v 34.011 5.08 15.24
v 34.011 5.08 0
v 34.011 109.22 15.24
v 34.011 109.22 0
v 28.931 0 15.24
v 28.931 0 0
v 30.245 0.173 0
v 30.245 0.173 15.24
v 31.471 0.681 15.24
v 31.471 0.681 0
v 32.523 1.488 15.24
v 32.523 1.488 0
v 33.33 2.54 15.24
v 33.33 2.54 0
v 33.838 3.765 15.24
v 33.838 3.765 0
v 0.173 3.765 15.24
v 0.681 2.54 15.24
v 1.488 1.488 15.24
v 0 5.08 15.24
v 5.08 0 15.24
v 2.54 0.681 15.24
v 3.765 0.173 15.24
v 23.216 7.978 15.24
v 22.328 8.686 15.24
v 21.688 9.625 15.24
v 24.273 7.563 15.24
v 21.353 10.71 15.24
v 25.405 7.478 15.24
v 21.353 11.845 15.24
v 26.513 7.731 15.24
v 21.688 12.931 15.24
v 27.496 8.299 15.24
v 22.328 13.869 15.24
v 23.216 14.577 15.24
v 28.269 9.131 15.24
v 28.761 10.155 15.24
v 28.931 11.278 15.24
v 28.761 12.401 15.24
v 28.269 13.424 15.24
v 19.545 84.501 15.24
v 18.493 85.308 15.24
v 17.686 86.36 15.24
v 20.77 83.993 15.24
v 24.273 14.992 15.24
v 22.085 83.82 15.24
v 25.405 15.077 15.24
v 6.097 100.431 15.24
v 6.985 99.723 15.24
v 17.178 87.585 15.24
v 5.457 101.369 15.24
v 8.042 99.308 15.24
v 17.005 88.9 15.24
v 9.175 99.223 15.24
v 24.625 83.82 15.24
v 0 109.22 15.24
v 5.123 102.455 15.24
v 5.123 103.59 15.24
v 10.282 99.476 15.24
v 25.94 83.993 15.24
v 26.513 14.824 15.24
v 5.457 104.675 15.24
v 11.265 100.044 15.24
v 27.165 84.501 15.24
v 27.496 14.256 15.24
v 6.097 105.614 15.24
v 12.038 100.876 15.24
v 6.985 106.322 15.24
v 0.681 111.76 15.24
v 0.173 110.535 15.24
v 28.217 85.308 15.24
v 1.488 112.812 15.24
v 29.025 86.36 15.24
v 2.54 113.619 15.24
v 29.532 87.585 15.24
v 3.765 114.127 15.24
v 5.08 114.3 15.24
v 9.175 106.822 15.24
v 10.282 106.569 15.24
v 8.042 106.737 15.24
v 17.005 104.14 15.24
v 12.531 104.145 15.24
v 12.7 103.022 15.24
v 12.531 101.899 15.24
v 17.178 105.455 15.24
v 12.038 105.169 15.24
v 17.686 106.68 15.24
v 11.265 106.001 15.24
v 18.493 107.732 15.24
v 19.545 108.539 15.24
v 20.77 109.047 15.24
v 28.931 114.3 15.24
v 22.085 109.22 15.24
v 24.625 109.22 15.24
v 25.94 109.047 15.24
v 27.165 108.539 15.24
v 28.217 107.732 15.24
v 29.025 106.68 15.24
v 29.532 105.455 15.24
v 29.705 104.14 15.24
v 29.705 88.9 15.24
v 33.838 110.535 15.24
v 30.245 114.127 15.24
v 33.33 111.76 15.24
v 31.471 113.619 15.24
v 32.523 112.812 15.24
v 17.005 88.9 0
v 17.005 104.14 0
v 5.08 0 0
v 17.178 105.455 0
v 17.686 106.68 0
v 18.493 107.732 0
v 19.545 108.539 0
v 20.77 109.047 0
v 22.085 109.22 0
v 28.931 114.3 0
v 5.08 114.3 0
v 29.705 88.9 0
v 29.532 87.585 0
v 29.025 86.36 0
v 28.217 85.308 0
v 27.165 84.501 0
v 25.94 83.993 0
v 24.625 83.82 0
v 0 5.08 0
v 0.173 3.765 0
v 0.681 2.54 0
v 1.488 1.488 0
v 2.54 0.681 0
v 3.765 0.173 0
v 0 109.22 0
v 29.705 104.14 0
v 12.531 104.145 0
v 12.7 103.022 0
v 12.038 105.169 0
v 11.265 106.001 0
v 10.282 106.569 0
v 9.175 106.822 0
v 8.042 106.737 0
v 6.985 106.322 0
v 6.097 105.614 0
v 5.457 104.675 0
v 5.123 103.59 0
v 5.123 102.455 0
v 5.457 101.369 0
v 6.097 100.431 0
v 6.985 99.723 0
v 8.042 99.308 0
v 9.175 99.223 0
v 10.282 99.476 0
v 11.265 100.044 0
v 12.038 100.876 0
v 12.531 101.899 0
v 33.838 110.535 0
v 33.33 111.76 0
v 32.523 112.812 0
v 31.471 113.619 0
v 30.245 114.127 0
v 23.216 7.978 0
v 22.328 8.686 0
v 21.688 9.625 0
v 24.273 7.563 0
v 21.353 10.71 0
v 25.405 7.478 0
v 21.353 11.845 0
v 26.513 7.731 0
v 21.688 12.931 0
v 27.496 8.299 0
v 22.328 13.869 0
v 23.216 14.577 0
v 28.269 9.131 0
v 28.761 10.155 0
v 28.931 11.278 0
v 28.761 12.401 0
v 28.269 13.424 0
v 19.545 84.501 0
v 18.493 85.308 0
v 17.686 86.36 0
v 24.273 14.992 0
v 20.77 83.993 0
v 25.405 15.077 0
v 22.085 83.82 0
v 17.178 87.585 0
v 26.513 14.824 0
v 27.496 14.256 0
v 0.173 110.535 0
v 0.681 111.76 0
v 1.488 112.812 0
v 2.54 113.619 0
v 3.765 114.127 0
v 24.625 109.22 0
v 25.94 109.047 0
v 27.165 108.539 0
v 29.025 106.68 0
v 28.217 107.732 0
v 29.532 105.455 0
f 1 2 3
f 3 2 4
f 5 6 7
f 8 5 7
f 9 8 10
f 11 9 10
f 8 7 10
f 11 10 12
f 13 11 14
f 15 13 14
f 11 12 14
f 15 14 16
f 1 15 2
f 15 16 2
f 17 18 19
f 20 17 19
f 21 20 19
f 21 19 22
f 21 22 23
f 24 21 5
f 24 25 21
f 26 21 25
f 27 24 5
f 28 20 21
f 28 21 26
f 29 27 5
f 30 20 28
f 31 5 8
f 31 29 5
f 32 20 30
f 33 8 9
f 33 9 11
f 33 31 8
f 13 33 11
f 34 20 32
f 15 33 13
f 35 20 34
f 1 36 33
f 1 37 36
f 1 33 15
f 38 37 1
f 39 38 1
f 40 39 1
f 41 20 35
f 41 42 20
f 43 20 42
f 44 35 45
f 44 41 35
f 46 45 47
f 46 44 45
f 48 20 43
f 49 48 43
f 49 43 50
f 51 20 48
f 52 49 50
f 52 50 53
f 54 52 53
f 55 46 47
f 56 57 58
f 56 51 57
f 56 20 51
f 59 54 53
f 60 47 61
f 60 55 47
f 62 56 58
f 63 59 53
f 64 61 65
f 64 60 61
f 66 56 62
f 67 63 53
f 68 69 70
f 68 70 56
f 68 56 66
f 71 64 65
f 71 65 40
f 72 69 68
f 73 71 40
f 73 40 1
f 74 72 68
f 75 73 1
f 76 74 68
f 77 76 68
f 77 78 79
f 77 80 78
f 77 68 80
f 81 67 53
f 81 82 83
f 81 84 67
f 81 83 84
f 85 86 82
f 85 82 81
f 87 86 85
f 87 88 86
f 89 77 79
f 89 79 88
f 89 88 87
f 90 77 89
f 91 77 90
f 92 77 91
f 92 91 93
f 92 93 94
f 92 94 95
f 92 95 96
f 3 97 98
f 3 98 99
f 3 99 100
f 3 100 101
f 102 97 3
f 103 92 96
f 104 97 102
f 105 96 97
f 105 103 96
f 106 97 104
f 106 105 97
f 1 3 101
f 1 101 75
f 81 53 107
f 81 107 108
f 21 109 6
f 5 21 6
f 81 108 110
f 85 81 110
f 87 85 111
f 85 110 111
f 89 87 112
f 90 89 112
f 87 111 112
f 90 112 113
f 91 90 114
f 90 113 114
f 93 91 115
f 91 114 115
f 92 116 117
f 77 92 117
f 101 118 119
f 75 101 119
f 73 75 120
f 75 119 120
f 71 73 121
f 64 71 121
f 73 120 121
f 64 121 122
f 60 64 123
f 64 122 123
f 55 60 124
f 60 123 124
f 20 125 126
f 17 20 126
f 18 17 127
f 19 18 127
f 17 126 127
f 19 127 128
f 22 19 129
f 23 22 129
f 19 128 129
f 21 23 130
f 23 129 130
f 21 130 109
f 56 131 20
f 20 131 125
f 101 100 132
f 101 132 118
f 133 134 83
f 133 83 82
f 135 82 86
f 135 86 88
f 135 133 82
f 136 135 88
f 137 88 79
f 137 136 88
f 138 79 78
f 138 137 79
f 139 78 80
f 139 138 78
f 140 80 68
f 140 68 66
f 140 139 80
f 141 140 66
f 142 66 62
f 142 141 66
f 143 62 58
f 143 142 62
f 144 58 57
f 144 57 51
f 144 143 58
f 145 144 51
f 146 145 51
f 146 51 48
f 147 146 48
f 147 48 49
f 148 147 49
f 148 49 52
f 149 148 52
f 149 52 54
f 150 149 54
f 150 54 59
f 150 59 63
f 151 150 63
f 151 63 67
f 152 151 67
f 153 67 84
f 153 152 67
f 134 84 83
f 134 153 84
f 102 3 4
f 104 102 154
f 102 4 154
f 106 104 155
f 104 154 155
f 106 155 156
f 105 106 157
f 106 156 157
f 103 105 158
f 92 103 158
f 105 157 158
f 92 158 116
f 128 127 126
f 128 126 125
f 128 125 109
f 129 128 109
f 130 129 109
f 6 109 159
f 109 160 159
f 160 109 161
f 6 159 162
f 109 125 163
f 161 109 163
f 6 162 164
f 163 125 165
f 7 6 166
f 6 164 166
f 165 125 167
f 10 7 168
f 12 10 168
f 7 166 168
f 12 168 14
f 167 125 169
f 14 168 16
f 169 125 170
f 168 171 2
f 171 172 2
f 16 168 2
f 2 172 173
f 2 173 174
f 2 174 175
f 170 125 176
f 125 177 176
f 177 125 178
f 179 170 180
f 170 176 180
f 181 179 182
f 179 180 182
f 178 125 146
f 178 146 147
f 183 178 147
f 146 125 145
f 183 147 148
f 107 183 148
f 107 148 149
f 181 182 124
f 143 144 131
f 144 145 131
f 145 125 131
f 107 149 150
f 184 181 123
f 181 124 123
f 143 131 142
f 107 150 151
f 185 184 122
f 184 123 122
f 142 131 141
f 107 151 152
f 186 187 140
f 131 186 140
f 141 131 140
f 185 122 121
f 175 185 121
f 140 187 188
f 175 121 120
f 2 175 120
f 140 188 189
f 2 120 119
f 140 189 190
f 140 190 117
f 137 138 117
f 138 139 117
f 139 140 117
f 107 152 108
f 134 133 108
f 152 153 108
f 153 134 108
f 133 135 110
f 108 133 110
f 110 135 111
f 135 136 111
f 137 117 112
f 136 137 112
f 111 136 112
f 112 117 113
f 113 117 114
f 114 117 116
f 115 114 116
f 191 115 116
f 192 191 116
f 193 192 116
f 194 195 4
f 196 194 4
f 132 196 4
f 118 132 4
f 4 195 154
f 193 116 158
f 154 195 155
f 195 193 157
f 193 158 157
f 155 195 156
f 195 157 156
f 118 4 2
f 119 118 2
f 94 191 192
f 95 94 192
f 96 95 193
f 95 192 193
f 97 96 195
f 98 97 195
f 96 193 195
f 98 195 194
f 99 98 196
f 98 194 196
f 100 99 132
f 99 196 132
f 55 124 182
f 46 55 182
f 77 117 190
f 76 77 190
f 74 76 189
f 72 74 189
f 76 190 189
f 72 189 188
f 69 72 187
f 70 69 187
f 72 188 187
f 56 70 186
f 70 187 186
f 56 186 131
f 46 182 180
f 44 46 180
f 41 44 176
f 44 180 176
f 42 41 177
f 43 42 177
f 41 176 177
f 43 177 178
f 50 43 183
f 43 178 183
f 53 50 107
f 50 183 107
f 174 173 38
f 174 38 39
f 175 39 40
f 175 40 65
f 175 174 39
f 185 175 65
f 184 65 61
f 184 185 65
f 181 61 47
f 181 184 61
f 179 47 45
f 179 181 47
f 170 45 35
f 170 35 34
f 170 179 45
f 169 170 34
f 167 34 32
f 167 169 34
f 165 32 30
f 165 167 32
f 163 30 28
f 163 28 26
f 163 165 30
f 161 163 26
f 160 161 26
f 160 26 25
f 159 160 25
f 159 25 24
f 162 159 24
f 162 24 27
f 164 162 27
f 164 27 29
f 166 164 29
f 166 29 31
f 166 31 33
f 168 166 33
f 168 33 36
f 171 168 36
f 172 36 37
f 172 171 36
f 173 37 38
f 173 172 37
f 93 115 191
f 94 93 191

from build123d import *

# Parameters (mm, degrees)
F0_R     = 3.81
F1_DEPTH = 15.24


with BuildPart() as f1:
    # F0 (on Top) → F1 (new body)
    with BuildSketch(Plane.XY):
        with BuildLine():
            ThreePointArc((0, 5.08), (1.487898, 1.487898), (5.08, 0))
            Line((5.08, 0), (28.9306, 0))
            ThreePointArc((28.9306, 0), (32.522702, 1.487898), (34.0106, 5.08))
            Line((34.0106, 5.08), (34.0106, 109.22))
            ThreePointArc((34.0106, 109.22), (32.522702, 112.812102), (28.9306, 114.3))
            Line((28.9306, 114.3), (5.08, 114.3))
            ThreePointArc((5.08, 114.3), (1.487898, 112.812102), (0, 109.22))
            Line((0, 109.22), (0, 5.08))
        make_face()
        with Locations((25.1206, 11.2776)):
            Circle(F0_R, mode=Mode.SUBTRACT)
        with Locations((8.89, 103.0224)):
            Circle(F0_R, mode=Mode.SUBTRACT)
        with BuildLine():
            ThreePointArc((17.0053, 104.14), (18.493198, 107.732102), (22.0853, 109.22))
            Line((22.0853, 109.22), (24.6253, 109.22))
            ThreePointArc((24.6253, 109.22), (28.217402, 107.732102), (29.7053, 104.14))
            Line((29.7053, 104.14), (29.7053, 88.9))
            ThreePointArc((29.7053, 88.9), (28.217402, 85.307898), (24.6253, 83.82))
            Line((24.6253, 83.82), (22.0853, 83.82))
            ThreePointArc((22.0853, 83.82), (18.493198, 85.307898), (17.0053, 88.9))
            Line((17.0053, 88.9), (17.0053, 104.14))
        make_face(mode=Mode.SUBTRACT)
    extrude(amount=F1_DEPTH)


solid = f1.part
